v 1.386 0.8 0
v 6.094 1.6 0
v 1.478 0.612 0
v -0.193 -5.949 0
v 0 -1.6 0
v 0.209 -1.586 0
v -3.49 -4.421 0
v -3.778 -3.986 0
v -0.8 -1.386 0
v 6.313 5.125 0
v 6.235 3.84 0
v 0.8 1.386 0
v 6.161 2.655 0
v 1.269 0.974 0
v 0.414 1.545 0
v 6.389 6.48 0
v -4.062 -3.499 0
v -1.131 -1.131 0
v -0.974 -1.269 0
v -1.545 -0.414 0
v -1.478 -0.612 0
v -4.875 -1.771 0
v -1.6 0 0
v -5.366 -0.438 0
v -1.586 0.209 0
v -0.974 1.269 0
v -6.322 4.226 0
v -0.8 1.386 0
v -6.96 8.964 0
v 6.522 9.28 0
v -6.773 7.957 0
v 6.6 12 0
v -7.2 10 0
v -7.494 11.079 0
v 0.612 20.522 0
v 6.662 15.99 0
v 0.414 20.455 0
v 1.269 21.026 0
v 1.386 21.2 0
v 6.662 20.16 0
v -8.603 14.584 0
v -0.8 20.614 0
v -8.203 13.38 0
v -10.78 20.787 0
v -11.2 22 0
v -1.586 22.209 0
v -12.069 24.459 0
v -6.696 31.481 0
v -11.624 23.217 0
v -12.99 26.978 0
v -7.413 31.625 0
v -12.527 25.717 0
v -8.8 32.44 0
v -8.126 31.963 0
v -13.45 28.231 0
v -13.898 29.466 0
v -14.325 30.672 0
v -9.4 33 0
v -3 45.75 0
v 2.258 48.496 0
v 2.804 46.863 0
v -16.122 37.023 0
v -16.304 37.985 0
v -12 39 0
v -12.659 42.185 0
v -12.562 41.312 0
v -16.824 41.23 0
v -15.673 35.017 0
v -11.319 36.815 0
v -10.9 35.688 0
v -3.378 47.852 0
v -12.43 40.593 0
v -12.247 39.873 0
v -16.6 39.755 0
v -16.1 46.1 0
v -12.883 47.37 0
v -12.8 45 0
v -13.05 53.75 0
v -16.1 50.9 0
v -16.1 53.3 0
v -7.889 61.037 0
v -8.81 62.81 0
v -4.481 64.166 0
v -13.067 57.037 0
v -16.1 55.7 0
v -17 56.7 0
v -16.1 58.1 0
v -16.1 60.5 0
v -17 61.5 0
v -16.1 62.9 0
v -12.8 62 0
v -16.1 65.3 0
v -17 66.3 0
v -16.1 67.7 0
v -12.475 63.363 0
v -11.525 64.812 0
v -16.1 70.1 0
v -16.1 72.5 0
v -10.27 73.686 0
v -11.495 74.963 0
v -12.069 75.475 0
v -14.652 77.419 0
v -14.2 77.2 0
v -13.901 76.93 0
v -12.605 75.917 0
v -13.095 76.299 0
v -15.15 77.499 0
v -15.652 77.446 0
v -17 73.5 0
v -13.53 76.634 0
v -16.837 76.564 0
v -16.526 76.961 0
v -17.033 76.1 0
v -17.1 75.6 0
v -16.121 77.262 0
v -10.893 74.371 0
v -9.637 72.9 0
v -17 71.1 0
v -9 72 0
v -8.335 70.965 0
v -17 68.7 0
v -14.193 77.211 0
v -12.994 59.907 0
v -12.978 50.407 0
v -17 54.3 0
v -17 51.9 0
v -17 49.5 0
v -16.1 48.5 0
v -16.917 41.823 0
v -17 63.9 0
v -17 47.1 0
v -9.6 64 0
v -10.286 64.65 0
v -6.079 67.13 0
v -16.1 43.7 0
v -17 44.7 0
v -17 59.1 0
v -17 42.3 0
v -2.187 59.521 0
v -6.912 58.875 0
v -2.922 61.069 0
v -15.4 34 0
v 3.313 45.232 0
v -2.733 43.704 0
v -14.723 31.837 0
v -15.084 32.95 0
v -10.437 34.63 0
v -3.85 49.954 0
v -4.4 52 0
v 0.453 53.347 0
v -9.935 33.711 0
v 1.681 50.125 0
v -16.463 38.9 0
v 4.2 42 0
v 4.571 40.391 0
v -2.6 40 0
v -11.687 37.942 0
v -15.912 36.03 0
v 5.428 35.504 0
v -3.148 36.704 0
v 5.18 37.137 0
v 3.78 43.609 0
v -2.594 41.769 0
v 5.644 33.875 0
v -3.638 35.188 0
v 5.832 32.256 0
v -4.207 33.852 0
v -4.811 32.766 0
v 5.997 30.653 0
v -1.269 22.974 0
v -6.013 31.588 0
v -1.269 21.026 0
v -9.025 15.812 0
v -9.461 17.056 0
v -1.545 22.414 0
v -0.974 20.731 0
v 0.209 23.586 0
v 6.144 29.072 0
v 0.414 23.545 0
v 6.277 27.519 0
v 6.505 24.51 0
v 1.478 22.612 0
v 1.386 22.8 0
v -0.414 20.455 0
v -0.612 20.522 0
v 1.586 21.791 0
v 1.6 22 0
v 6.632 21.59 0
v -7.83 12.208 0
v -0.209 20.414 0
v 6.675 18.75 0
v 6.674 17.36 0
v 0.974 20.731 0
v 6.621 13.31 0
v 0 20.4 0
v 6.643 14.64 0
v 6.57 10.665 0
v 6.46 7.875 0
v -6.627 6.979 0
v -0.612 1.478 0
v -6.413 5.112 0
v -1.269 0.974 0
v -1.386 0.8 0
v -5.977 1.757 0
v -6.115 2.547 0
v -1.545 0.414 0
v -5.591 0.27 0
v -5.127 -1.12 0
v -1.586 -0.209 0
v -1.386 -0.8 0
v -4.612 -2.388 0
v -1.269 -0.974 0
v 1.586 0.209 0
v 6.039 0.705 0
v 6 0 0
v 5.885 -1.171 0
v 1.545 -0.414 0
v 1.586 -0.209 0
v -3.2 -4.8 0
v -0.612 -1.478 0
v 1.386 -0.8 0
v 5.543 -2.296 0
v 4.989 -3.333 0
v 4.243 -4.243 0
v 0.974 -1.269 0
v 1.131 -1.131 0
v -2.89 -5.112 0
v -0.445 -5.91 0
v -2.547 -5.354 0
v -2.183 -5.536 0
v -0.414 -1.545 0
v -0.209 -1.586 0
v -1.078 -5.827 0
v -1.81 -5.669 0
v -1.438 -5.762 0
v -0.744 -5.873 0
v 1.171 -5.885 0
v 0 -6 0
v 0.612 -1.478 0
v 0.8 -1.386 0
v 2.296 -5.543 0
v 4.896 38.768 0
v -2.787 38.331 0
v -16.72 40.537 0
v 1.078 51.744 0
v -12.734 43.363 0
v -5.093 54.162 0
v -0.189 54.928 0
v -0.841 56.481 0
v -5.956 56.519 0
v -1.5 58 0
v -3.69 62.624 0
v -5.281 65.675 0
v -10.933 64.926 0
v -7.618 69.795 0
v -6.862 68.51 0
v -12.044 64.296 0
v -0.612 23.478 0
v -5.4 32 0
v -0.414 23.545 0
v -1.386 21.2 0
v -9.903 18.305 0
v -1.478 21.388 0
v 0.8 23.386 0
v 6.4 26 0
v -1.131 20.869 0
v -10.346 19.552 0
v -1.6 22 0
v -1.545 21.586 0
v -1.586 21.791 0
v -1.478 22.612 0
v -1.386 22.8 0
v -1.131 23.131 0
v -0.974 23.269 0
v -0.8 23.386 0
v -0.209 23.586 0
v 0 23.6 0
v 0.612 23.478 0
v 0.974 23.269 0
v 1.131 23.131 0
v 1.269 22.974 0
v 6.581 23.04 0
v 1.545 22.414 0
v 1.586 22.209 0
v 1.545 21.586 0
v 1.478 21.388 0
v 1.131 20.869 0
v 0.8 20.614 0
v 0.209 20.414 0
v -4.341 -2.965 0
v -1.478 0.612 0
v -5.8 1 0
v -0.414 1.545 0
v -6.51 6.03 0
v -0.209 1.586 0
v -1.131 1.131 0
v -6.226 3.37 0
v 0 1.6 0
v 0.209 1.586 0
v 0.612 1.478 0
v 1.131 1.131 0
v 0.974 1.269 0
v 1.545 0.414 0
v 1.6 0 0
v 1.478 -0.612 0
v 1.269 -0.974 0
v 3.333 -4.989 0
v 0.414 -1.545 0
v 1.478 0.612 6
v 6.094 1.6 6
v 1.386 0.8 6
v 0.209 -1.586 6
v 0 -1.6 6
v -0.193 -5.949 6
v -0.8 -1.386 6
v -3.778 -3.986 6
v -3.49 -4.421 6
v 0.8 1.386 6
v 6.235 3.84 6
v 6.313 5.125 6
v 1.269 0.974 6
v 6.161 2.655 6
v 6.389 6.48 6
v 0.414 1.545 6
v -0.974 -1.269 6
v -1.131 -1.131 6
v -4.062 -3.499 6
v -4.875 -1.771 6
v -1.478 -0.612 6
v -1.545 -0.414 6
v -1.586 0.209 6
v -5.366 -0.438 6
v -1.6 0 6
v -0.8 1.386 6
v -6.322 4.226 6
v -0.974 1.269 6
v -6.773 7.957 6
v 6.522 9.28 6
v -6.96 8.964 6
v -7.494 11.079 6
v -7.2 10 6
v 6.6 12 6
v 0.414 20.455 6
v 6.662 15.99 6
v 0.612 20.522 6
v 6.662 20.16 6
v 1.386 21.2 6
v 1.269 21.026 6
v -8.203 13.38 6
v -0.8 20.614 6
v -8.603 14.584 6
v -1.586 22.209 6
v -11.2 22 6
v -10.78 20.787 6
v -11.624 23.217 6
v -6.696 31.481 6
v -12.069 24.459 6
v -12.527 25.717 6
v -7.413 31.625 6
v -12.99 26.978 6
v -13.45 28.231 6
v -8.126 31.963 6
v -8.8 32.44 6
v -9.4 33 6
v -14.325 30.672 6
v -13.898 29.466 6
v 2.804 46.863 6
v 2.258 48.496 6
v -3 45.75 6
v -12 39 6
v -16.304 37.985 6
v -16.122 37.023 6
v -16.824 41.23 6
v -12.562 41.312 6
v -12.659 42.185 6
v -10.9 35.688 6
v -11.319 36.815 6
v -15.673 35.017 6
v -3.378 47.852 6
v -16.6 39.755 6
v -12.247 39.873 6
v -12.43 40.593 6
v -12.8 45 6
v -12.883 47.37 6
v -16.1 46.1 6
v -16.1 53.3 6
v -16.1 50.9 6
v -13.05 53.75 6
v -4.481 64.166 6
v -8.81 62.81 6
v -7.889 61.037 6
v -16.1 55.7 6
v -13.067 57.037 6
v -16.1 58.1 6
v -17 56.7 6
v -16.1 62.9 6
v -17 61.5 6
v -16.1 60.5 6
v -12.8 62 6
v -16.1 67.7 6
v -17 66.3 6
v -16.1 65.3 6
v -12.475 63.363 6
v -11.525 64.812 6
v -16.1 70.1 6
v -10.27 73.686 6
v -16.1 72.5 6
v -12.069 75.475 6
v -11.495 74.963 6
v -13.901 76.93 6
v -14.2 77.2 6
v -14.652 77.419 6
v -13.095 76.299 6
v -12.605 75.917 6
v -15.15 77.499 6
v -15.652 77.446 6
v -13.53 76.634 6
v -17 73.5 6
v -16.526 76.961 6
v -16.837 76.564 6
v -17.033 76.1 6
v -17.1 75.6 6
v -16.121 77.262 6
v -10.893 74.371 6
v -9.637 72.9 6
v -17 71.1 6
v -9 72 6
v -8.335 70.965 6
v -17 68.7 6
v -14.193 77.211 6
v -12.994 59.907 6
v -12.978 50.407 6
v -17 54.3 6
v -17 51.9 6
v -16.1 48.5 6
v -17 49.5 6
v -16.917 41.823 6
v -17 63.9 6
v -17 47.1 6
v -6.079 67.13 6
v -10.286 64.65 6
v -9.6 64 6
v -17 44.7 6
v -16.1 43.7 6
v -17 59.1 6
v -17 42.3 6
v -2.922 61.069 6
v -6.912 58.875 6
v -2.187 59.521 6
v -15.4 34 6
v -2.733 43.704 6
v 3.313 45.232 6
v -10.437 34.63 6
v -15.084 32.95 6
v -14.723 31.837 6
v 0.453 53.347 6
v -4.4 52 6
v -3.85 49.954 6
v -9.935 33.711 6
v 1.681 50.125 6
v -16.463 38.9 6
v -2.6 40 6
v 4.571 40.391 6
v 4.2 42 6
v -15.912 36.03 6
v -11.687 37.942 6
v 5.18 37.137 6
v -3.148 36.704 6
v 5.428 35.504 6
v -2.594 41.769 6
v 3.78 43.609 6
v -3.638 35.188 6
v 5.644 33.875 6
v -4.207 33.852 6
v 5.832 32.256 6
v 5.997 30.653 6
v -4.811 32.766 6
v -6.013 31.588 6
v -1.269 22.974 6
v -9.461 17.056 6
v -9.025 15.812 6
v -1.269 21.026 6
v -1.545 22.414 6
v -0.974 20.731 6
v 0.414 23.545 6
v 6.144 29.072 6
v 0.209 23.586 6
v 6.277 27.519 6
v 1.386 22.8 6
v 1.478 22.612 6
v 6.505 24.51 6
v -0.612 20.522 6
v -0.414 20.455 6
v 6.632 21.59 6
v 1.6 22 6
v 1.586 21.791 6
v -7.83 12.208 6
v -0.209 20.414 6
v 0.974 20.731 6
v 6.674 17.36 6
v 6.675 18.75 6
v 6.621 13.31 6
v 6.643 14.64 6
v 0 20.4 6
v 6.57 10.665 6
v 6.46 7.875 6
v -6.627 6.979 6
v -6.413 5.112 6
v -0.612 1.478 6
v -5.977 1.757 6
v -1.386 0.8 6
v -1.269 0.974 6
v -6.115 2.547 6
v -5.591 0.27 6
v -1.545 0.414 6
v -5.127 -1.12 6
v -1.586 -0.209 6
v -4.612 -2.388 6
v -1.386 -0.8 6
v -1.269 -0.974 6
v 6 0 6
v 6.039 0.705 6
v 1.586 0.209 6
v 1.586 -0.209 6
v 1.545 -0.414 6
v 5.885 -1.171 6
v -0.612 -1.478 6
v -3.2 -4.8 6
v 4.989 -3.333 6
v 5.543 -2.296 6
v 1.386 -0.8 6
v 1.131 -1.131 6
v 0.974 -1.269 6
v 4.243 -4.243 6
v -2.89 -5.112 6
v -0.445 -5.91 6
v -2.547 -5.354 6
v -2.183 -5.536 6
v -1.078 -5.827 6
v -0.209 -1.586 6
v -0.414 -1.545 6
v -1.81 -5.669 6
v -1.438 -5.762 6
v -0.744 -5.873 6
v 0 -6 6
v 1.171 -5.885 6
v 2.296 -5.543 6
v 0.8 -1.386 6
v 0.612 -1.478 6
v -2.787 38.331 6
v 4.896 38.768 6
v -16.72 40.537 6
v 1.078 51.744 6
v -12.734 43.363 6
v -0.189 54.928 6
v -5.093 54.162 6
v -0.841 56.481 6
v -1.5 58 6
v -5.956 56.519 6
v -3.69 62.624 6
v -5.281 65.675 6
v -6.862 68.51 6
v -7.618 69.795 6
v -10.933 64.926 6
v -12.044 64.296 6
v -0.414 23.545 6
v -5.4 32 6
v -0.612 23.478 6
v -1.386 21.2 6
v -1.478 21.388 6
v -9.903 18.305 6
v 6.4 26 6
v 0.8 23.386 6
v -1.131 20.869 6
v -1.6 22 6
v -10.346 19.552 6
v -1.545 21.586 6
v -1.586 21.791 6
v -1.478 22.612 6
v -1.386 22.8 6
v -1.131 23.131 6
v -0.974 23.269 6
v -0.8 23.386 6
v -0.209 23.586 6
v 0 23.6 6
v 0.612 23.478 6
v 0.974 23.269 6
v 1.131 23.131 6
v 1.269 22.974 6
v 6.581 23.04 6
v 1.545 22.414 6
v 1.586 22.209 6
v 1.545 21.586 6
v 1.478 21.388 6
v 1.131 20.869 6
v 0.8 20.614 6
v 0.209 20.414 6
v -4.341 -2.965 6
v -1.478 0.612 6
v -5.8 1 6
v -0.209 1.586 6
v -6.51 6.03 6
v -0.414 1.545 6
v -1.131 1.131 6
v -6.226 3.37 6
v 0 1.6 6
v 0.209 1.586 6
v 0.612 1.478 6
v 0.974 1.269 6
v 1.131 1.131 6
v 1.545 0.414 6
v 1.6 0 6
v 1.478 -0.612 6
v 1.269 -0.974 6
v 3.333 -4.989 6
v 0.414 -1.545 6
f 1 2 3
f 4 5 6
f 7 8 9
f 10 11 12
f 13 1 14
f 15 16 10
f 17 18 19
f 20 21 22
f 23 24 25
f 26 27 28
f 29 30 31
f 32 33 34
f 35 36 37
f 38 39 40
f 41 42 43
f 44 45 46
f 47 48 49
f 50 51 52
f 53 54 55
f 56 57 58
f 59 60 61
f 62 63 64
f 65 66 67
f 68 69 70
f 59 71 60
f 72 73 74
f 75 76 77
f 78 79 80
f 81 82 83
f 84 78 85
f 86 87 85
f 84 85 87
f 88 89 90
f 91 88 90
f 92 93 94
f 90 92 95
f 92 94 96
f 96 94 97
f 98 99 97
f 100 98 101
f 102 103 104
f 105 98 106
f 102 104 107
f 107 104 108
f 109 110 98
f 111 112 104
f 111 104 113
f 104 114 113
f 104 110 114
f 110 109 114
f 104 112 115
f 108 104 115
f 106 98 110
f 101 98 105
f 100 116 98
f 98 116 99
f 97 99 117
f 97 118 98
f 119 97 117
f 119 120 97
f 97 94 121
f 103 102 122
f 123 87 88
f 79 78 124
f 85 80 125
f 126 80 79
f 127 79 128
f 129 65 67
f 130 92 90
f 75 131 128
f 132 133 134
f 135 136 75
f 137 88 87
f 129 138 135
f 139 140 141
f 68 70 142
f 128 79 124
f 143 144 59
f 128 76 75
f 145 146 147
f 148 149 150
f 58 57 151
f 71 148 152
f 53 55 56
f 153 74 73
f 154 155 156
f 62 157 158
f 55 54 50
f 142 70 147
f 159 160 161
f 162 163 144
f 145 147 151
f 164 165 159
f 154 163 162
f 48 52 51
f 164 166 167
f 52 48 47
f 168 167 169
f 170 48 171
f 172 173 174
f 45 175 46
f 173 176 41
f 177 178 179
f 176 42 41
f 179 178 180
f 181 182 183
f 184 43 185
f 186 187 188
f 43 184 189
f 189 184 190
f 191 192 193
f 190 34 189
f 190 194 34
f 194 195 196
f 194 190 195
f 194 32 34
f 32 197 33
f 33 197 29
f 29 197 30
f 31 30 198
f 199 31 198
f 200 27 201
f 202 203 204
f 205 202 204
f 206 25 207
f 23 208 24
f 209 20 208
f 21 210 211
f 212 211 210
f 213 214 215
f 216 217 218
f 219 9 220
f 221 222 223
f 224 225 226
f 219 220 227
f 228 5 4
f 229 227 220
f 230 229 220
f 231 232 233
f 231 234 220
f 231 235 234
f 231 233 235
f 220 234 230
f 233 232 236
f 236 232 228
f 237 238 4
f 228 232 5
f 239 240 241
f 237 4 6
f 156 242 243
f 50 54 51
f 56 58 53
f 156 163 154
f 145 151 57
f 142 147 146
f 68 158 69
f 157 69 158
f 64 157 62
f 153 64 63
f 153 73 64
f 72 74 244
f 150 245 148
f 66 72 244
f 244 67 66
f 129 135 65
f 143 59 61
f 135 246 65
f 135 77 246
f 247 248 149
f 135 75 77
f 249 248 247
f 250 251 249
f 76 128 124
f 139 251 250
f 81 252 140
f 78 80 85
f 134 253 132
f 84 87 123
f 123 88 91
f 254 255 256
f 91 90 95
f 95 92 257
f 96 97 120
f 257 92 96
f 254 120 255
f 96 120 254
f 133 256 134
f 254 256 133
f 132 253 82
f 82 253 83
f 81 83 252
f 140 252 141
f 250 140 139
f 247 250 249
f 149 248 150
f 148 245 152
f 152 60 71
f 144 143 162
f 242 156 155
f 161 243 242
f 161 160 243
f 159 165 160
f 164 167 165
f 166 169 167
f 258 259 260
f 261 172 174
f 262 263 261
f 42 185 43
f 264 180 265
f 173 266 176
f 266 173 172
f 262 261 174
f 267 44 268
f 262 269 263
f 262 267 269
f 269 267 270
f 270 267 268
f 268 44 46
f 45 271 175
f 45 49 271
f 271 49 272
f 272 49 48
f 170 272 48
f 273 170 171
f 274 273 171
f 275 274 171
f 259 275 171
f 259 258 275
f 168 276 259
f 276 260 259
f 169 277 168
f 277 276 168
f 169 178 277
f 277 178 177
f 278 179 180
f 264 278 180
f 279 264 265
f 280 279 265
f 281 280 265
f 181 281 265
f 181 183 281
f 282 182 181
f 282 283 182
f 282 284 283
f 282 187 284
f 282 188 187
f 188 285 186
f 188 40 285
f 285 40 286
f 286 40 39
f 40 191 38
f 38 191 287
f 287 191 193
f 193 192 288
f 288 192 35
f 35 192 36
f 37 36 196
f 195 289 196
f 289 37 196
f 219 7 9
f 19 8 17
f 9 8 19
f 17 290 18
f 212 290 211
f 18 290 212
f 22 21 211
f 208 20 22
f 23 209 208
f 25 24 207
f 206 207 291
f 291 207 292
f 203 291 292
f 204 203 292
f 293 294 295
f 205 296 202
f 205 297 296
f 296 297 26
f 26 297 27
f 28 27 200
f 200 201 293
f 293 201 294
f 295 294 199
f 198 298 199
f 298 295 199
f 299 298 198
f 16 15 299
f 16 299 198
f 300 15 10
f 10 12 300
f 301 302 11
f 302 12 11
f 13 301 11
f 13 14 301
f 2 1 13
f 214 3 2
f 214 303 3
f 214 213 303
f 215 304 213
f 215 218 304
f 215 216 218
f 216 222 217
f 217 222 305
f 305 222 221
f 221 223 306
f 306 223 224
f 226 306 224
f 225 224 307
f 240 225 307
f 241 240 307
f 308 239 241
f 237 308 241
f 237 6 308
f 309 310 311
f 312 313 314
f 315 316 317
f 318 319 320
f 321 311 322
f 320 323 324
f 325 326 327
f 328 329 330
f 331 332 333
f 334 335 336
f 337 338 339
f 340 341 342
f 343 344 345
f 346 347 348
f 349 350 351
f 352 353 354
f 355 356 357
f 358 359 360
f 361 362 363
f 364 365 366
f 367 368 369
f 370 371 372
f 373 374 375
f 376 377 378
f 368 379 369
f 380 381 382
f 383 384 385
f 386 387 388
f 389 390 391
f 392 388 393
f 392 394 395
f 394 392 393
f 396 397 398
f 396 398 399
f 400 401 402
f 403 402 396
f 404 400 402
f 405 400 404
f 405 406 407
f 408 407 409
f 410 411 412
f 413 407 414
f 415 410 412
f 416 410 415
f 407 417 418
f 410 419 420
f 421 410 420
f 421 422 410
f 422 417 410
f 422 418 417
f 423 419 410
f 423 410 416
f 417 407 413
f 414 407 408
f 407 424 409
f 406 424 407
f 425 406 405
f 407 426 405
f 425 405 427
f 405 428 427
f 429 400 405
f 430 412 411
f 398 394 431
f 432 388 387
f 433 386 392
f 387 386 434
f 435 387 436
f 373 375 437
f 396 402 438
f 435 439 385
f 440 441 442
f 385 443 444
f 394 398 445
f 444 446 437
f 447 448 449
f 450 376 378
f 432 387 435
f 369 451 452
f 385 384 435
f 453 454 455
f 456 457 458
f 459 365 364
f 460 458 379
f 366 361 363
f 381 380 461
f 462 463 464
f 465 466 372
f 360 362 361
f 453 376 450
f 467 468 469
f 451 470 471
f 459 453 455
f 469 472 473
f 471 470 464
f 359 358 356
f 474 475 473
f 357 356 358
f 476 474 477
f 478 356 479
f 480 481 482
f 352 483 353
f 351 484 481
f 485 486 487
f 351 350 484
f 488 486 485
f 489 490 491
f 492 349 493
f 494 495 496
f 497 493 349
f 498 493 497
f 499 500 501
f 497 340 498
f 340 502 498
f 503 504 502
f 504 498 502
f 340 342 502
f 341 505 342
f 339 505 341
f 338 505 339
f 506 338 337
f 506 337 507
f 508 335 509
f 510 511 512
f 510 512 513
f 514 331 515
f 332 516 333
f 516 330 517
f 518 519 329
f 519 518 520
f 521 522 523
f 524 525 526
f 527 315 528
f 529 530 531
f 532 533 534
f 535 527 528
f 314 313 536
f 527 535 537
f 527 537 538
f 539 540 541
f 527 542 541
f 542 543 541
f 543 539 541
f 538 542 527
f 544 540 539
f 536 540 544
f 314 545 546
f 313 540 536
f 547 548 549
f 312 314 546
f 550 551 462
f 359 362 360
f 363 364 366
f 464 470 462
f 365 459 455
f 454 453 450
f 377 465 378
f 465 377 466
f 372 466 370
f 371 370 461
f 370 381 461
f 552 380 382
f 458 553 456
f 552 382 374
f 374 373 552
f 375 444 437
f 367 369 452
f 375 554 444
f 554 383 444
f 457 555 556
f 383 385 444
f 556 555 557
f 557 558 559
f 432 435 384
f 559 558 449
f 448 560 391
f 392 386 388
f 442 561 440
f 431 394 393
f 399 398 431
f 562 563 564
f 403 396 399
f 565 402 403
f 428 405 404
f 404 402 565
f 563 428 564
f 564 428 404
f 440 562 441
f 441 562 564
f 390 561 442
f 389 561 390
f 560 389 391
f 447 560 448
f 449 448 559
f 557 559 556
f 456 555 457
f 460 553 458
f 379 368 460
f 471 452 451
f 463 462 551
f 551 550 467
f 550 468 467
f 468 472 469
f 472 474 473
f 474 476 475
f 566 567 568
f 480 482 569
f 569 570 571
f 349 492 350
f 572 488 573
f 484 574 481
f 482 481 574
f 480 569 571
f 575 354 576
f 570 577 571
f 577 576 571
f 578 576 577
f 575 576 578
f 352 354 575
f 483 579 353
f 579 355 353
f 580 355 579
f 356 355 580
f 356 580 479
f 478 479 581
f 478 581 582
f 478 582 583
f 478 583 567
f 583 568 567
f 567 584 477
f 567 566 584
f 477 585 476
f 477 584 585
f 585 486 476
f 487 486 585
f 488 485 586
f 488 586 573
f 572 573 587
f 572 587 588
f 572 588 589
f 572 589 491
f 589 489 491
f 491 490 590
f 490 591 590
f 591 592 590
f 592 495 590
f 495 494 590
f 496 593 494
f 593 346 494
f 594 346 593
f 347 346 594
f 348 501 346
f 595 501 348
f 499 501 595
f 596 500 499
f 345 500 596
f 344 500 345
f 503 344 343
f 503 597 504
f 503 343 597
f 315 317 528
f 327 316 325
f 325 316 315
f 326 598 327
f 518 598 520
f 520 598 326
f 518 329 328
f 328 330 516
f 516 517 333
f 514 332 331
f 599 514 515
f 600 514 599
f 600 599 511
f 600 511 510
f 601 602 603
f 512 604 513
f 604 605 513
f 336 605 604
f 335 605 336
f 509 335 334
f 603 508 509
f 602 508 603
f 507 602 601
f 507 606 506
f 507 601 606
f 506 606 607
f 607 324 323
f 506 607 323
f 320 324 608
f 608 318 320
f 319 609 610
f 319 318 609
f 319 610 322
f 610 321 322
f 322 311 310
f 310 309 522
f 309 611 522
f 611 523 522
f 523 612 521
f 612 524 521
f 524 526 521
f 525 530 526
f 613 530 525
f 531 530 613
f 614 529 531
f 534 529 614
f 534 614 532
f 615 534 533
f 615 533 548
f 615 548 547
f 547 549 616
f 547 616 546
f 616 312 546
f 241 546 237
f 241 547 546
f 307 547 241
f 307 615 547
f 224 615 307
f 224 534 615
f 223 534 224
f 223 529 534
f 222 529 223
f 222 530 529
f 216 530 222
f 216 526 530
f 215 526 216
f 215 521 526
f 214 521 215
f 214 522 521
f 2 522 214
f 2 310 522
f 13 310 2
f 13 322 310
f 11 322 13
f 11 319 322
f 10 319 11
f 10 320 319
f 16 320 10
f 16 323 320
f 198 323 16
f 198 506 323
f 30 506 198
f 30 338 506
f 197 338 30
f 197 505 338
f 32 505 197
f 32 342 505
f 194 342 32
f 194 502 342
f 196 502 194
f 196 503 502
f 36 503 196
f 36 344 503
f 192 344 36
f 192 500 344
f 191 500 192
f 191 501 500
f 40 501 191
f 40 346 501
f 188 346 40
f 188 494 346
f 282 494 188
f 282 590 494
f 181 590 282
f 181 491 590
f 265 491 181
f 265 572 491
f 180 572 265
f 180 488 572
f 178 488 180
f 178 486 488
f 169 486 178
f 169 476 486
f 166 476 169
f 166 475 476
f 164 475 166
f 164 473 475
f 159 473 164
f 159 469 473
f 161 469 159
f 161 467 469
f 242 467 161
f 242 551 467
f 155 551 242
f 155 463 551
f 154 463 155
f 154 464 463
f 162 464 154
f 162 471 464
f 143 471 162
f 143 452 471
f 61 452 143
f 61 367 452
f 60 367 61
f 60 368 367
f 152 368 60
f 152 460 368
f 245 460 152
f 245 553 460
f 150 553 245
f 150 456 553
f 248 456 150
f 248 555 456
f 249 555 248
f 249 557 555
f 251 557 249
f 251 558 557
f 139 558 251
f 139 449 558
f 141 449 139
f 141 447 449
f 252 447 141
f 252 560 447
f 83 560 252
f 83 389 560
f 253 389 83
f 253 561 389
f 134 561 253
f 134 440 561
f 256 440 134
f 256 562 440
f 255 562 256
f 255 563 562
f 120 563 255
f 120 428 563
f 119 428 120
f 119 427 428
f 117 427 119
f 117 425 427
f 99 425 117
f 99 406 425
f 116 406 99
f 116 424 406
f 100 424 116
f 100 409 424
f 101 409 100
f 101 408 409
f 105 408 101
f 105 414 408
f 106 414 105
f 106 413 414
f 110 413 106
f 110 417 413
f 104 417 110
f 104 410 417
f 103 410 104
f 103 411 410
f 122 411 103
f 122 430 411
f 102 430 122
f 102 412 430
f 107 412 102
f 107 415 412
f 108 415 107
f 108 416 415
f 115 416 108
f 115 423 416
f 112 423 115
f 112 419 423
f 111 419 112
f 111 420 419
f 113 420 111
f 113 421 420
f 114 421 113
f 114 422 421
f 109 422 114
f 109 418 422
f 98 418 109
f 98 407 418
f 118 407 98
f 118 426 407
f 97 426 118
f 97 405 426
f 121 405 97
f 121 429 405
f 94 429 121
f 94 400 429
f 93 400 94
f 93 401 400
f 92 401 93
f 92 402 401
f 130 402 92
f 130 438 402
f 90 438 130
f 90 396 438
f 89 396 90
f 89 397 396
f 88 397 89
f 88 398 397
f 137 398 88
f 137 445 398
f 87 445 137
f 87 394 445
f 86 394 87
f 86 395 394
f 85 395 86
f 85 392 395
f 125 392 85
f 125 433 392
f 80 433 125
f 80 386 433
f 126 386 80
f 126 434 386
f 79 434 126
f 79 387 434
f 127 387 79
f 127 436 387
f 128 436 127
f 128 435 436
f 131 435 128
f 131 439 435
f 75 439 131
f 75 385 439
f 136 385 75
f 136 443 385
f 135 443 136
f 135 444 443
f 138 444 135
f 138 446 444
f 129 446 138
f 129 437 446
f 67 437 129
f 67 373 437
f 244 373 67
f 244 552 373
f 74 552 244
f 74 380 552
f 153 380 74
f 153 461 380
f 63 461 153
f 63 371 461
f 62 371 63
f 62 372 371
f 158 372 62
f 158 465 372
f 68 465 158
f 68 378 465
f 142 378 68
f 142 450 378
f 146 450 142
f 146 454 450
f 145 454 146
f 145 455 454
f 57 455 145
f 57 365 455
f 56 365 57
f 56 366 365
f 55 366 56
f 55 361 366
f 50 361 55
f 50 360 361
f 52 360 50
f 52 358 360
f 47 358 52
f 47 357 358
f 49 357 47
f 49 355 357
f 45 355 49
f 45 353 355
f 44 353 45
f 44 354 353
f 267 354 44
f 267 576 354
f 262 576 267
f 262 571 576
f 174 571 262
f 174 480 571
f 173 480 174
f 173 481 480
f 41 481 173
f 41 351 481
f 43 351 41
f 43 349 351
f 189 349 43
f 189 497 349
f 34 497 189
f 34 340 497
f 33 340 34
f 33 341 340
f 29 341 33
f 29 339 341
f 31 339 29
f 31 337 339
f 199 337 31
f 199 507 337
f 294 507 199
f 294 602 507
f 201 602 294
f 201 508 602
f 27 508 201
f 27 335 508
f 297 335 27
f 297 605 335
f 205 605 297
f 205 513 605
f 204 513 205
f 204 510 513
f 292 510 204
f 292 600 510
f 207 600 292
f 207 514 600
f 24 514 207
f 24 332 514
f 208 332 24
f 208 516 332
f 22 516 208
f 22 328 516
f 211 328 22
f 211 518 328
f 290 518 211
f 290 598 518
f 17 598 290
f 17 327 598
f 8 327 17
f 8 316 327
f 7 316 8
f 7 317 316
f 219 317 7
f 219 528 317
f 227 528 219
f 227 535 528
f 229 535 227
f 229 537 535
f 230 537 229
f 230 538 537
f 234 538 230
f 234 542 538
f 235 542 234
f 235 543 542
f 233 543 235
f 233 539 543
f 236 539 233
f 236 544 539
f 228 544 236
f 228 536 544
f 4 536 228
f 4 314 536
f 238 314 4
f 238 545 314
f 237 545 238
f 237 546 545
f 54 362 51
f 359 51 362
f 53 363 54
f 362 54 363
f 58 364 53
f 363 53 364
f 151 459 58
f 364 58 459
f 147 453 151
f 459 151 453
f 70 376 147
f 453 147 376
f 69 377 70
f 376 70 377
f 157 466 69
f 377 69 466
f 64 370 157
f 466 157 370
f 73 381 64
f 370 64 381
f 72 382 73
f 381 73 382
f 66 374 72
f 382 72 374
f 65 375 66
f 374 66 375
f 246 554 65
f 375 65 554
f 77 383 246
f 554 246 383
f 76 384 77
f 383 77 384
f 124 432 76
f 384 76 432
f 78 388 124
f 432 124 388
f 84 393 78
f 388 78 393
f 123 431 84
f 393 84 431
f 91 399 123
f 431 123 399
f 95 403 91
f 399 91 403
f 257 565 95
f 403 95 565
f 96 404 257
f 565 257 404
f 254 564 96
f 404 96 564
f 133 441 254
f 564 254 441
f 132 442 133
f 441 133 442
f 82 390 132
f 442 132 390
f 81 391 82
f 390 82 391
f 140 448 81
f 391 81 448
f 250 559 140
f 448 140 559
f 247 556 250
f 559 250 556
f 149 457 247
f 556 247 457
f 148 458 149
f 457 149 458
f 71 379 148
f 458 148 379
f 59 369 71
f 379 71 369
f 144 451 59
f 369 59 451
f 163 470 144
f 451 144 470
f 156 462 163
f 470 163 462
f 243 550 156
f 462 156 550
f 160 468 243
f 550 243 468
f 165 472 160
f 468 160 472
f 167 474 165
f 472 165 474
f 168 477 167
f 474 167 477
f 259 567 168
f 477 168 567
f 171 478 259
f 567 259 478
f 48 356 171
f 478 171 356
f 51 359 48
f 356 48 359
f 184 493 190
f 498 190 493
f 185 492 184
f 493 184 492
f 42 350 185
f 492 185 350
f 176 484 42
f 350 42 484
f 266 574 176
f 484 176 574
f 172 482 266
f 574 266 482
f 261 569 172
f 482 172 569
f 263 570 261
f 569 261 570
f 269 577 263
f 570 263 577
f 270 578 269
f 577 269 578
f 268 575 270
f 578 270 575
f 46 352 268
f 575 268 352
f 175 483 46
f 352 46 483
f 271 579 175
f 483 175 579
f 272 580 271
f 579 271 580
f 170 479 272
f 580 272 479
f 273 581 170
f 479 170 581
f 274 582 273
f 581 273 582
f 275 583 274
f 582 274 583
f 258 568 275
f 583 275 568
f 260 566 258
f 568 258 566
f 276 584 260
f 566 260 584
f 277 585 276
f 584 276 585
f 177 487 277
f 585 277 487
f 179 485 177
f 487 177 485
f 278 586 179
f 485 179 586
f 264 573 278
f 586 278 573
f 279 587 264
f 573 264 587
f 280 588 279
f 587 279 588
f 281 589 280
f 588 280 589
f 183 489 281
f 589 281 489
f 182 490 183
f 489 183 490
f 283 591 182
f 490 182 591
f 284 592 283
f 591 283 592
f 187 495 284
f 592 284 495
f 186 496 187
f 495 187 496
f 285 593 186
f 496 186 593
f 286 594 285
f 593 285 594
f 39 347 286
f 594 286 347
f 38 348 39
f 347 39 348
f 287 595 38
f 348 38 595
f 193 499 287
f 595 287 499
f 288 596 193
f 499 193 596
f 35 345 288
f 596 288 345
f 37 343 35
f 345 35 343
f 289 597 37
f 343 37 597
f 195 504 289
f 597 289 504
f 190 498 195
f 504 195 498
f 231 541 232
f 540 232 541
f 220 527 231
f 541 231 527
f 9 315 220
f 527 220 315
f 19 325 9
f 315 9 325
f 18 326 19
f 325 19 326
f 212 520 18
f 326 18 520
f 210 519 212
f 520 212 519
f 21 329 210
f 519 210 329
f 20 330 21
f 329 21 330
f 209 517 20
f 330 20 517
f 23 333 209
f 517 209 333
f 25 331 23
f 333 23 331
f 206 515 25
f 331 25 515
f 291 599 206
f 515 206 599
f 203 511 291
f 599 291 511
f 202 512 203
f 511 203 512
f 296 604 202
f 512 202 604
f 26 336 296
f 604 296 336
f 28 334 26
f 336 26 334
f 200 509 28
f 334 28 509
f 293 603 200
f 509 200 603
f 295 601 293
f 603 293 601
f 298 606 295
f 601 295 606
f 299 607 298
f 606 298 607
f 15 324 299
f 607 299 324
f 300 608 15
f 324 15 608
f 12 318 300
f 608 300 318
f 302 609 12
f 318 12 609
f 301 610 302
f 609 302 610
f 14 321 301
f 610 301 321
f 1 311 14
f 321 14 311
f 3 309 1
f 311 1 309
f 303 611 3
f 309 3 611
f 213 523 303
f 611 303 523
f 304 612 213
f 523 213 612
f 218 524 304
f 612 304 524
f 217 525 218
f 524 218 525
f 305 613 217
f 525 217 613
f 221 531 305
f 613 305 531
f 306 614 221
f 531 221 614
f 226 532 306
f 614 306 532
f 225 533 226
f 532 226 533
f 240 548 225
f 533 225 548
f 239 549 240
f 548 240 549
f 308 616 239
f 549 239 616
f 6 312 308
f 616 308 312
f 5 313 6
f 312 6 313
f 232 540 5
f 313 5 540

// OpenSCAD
// Pinza a ingranaggi e parallelogramma. Generato da genera_pinza.py: modifica li' le misure.
$fn=48;
parte = "dito"; // dito, biella_motore, biella_folle, leva, piastra_bassa, piastra_alta, colonnina

module dito() linear_extrude(6.0)
difference() { polygon([[6.000,0.000],[6.039,0.705],[6.094,1.600],[6.161,2.655],[6.235,3.840],[6.313,5.125],[6.389,6.480],[6.460,7.875],[6.522,9.280],[6.570,10.665],[6.600,12.000],[6.621,13.310],[6.643,14.640],[6.662,15.990],[6.674,17.360],[6.675,18.750],[6.662,20.160],[6.632,21.590],[6.581,23.040],[6.505,24.510],[6.400,26.000],[6.277,27.519],[6.144,29.072],[5.997,30.653],[5.832,32.256],[5.644,33.875],[5.428,35.504],[5.180,37.137],[4.896,38.768],[4.571,40.391],[4.200,42.000],[3.780,43.609],[3.313,45.232],[2.804,46.863],[2.258,48.496],[1.681,50.125],[1.078,51.744],[0.453,53.347],[-0.189,54.928],[-0.841,56.481],[-1.500,58.000],[-2.187,59.521],[-2.922,61.069],[-3.690,62.624],[-4.481,64.166],[-5.281,65.675],[-6.079,67.130],[-6.862,68.510],[-7.618,69.795],[-8.335,70.965],[-9.000,72.000],[-9.637,72.900],[-10.270,73.686],[-10.893,74.371],[-11.495,74.963],[-12.069,75.475],[-12.605,75.917],[-13.095,76.299],[-13.530,76.634],[-13.901,76.930],[-14.200,77.200],[-14.193,77.211],[-14.652,77.419],[-15.150,77.499],[-15.652,77.446],[-16.121,77.262],[-16.526,76.961],[-16.837,76.564],[-17.033,76.100],[-17.100,75.600],[-17.000,73.500],[-16.100,72.500],[-17.000,71.100],[-17.000,71.100],[-16.100,70.100],[-17.000,68.700],[-17.000,68.700],[-16.100,67.700],[-17.000,66.300],[-17.000,66.300],[-16.100,65.300],[-17.000,63.900],[-17.000,63.900],[-16.100,62.900],[-17.000,61.500],[-17.000,61.500],[-16.100,60.500],[-17.000,59.100],[-17.000,59.100],[-16.100,58.100],[-17.000,56.700],[-17.000,56.700],[-16.100,55.700],[-17.000,54.300],[-17.000,54.300],[-16.100,53.300],[-17.000,51.900],[-17.000,51.900],[-16.100,50.900],[-17.000,49.500],[-17.000,49.500],[-16.100,48.500],[-17.000,47.100],[-17.000,47.100],[-16.100,46.100],[-17.000,44.700],[-17.000,44.700],[-16.100,43.700],[-17.000,42.300],[-17.000,42.300],[-16.917,41.823],[-16.824,41.230],[-16.720,40.537],[-16.600,39.755],[-16.463,38.900],[-16.304,37.985],[-16.122,37.023],[-15.912,36.030],[-15.673,35.017],[-15.400,34.000],[-15.084,32.950],[-14.723,31.837],[-14.325,30.672],[-13.898,29.466],[-13.450,28.231],[-12.990,26.978],[-12.527,25.717],[-12.069,24.459],[-11.624,23.217],[-11.200,22.000],[-10.780,20.787],[-10.346,19.552],[-9.903,18.305],[-9.461,17.056],[-9.025,15.812],[-8.603,14.584],[-8.203,13.380],[-7.830,12.208],[-7.494,11.079],[-7.200,10.000],[-6.960,8.964],[-6.773,7.957],[-6.627,6.979],[-6.510,6.030],[-6.413,5.112],[-6.322,4.226],[-6.226,3.370],[-6.115,2.547],[-5.977,1.757],[-5.800,1.000],[-5.591,0.270],[-5.366,-0.438],[-5.127,-1.120],[-4.875,-1.771],[-4.612,-2.388],[-4.341,-2.965],[-4.062,-3.499],[-3.778,-3.986],[-3.490,-4.421],[-3.200,-4.800],[-2.890,-5.112],[-2.547,-5.354],[-2.183,-5.536],[-1.810,-5.669],[-1.438,-5.762],[-1.078,-5.827],[-0.744,-5.873],[-0.445,-5.910],[-0.193,-5.949],[0.000,-6.000],[1.171,-5.885],[2.296,-5.543],[3.333,-4.989],[4.243,-4.243],[4.989,-3.333],[5.543,-2.296],[5.885,-1.171],[6.000,0.000]]);
translate([0,0]) circle(d=3.2);
translate([0,22.0]) circle(d=3.2);
polygon([[-12.800,45.000],[-12.883,47.370],[-12.978,50.407],[-13.050,53.750],[-13.067,57.037],[-12.994,59.907],[-12.800,62.000],[-12.475,63.363],[-12.044,64.296],[-11.525,64.812],[-10.933,64.926],[-10.286,64.650],[-9.600,64.000],[-8.810,62.810],[-7.889,61.037],[-6.912,58.875],[-5.956,56.519],[-5.093,54.162],[-4.400,52.000],[-3.850,49.954],[-3.378,47.852],[-3.000,45.750],[-2.733,43.704],[-2.594,41.769],[-2.600,40.000],[-2.787,38.331],[-3.148,36.704],[-3.638,35.188],[-4.207,33.852],[-4.811,32.766],[-5.400,32.000],[-6.013,31.588],[-6.696,31.481],[-7.413,31.625],[-8.126,31.963],[-8.800,32.440],[-9.400,33.000],[-9.935,33.711],[-10.437,34.630],[-10.900,35.688],[-11.319,36.815],[-11.687,37.942],[-12.000,39.000],[-12.247,39.873],[-12.430,40.593],[-12.562,41.312],[-12.659,42.185],[-12.734,43.363]]);
}

module biella_motore() linear_extrude(5)
difference() { polygon([[8.200,-5.200],[40.000,-6.000],[41.171,-5.885],[42.296,-5.543],[43.333,-4.989],[44.243,-4.243],[44.989,-3.333],[45.543,-2.296],[45.885,-1.171],[46.000,0.000],[45.885,1.171],[45.543,2.296],[44.989,3.333],[44.243,4.243],[43.333,4.989],[42.296,5.543],[41.171,5.885],[40.000,6.000],[8.200,5.200],[6.233,6.141],[6.519,6.768],[6.673,6.990],[6.800,7.238],[6.907,7.504],[6.996,7.783],[7.069,8.076],[7.126,8.379],[6.715,8.713],[6.430,8.594],[6.159,8.462],[5.904,8.316],[5.667,8.156],[5.450,7.981],[5.265,7.783],[4.711,7.373],[4.030,7.767],[4.108,8.451],[4.186,8.710],[4.230,8.985],[4.250,9.271],[4.249,9.564],[4.228,9.865],[4.188,10.171],[3.694,10.361],[3.459,10.160],[3.243,9.951],[3.045,9.733],[2.869,9.508],[2.717,9.274],[2.602,9.029],[2.202,8.468],[1.433,8.632],[1.295,9.307],[1.290,9.578],[1.246,9.853],[1.177,10.130],[1.085,10.409],[0.972,10.689],[0.840,10.968],[0.311,10.996],[0.150,10.732],[0.009,10.466],[-0.112,10.198],[-0.210,9.929],[-0.281,9.660],[-0.316,9.392],[-0.523,8.734],[-1.305,8.652],[-1.644,9.252],[-1.733,9.507],[-1.859,9.756],[-2.011,9.998],[-2.185,10.235],[-2.378,10.466],[-2.590,10.691],[-3.102,10.554],[-3.173,10.253],[-3.226,9.956],[-3.258,9.664],[-3.268,9.378],[-3.253,9.100],[-3.202,8.834],[-3.196,8.145],[-3.915,7.826],[-4.423,8.291],[-4.586,8.507],[-4.783,8.704],[-5.002,8.887],[-5.241,9.059],[-5.496,9.219],[-5.767,9.367],[-6.211,9.078],[-6.186,8.771],[-6.144,8.472],[-6.084,8.185],[-6.006,7.910],[-5.906,7.650],[-5.776,7.413],[-5.557,6.759],[-6.141,6.233],[-6.768,6.519],[-6.990,6.673],[-7.238,6.800],[-7.504,6.907],[-7.783,6.996],[-8.076,7.069],[-8.379,7.126],[-8.713,6.715],[-8.594,6.430],[-8.462,6.159],[-8.316,5.904],[-8.156,5.667],[-7.981,5.450],[-7.783,5.265],[-7.373,4.711],[-7.767,4.030],[-8.451,4.108],[-8.710,4.186],[-8.985,4.230],[-9.271,4.250],[-9.564,4.249],[-9.865,4.228],[-10.171,4.188],[-10.361,3.694],[-10.160,3.459],[-9.951,3.243],[-9.733,3.045],[-9.508,2.869],[-9.274,2.717],[-9.029,2.602],[-8.468,2.202],[-8.632,1.433],[-9.307,1.295],[-9.578,1.290],[-9.853,1.246],[-10.130,1.177],[-10.409,1.085],[-10.689,0.972],[-10.968,0.840],[-10.996,0.311],[-10.732,0.150],[-10.466,0.009],[-10.198,-0.112],[-9.929,-0.210],[-9.660,-0.281],[-9.392,-0.316],[-8.734,-0.523],[-8.652,-1.305],[-9.252,-1.644],[-9.507,-1.733],[-9.756,-1.859],[-9.998,-2.011],[-10.235,-2.185],[-10.466,-2.378],[-10.691,-2.590],[-10.554,-3.102],[-10.253,-3.173],[-9.956,-3.226],[-9.664,-3.258],[-9.378,-3.268],[-9.100,-3.253],[-8.834,-3.202],[-8.145,-3.196],[-7.826,-3.915],[-8.291,-4.423],[-8.507,-4.586],[-8.704,-4.783],[-8.887,-5.002],[-9.059,-5.241],[-9.219,-5.496],[-9.367,-5.767],[-9.078,-6.211],[-8.771,-6.186],[-8.472,-6.144],[-8.185,-6.084],[-7.910,-6.006],[-7.650,-5.906],[-7.413,-5.776],[-6.759,-5.557],[-6.233,-6.141],[-6.519,-6.768],[-6.673,-6.990],[-6.800,-7.238],[-6.907,-7.504],[-6.996,-7.783],[-7.069,-8.076],[-7.126,-8.379],[-6.715,-8.713],[-6.430,-8.594],[-6.159,-8.462],[-5.904,-8.316],[-5.667,-8.156],[-5.450,-7.981],[-5.265,-7.783],[-4.711,-7.373],[-4.030,-7.767],[-4.108,-8.451],[-4.186,-8.710],[-4.230,-8.985],[-4.250,-9.271],[-4.249,-9.564],[-4.228,-9.865],[-4.188,-10.171],[-3.694,-10.361],[-3.459,-10.160],[-3.243,-9.951],[-3.045,-9.733],[-2.869,-9.508],[-2.717,-9.274],[-2.602,-9.029],[-2.202,-8.468],[-1.433,-8.632],[-1.295,-9.307],[-1.290,-9.578],[-1.246,-9.853],[-1.177,-10.130],[-1.085,-10.409],[-0.972,-10.689],[-0.840,-10.968],[-0.311,-10.996],[-0.150,-10.732],[-0.009,-10.466],[0.112,-10.198],[0.210,-9.929],[0.281,-9.660],[0.316,-9.392],[0.523,-8.734],[1.305,-8.652],[1.644,-9.252],[1.733,-9.507],[1.859,-9.756],[2.011,-9.998],[2.185,-10.235],[2.378,-10.466],[2.590,-10.691],[3.102,-10.554],[3.173,-10.253],[3.226,-9.956],[3.258,-9.664],[3.268,-9.378],[3.253,-9.100],[3.202,-8.834],[3.196,-8.145],[3.915,-7.826],[4.423,-8.291],[4.586,-8.507],[4.783,-8.704],[5.002,-8.887],[5.241,-9.059],[5.496,-9.219],[5.767,-9.367],[6.211,-9.078],[6.186,-8.771],[6.144,-8.472],[6.084,-8.185],[6.006,-7.910],[5.906,-7.650],[5.776,-7.413],[5.557,-6.759],[6.141,-6.233],[6.768,-6.519],[6.990,-6.673],[7.238,-6.800],[7.504,-6.907],[7.783,-6.996],[8.076,-7.069]]);
translate([0,0]) circle(d=3.2);
translate([40.0,0]) circle(d=3.2);
polygon([[29.000,-2.300],[29.449,-2.256],[29.880,-2.125],[30.278,-1.912],[30.626,-1.626],[30.912,-1.278],[31.125,-0.880],[31.256,-0.449],[31.300,0.000],[31.256,0.449],[31.125,0.880],[30.912,1.278],[30.626,1.626],[30.278,1.912],[29.880,2.125],[29.449,2.256],[29.000,2.300],[16.000,2.300],[15.551,2.256],[15.120,2.125],[14.722,1.912],[14.374,1.626],[14.088,1.278],[13.875,0.880],[13.744,0.449],[13.700,0.000],[13.744,-0.449],[13.875,-0.880],[14.088,-1.278],[14.374,-1.626],[14.722,-1.912],[15.120,-2.125],[15.551,-2.256],[16.000,-2.300]]);
}

module biella_folle() linear_extrude(5)
difference() { polygon([[8.200,-5.200],[40.000,-6.000],[41.171,-5.885],[42.296,-5.543],[43.333,-4.989],[44.243,-4.243],[44.989,-3.333],[45.543,-2.296],[45.885,-1.171],[46.000,0.000],[45.885,1.171],[45.543,2.296],[44.989,3.333],[44.243,4.243],[43.333,4.989],[42.296,5.543],[41.171,5.885],[40.000,6.000],[8.200,5.200],[7.995,7.555],[7.695,7.482],[7.407,7.394],[7.132,7.290],[6.873,7.169],[6.632,7.030],[6.418,6.864],[5.807,6.546],[5.195,7.041],[5.380,7.705],[5.497,7.948],[5.584,8.213],[5.648,8.492],[5.692,8.782],[5.719,9.082],[5.728,9.391],[5.269,9.656],[5.006,9.494],[4.759,9.321],[4.530,9.137],[4.321,8.942],[4.135,8.735],[3.983,8.511],[3.500,8.020],[2.765,8.301],[2.736,8.990],[2.772,9.258],[2.772,9.536],[2.747,9.821],[2.700,10.111],[2.632,10.405],[2.545,10.701],[2.027,10.812],[1.827,10.576],[1.646,10.335],[1.485,10.090],[1.346,9.840],[1.233,9.585],[1.158,9.325],[0.850,8.709],[0.065,8.750],[-0.176,9.395],[-0.225,9.661],[-0.310,9.926],[-0.422,10.190],[-0.557,10.451],[-0.712,10.709],[-0.886,10.964],[-1.413,10.909],[-1.530,10.623],[-1.628,10.338],[-1.706,10.055],[-1.760,9.774],[-1.789,9.497],[-1.781,9.227],[-1.883,8.545],[-2.642,8.342],[-3.071,8.881],[-3.199,9.119],[-3.363,9.345],[-3.550,9.561],[-3.759,9.767],[-3.986,9.965],[-4.231,10.154],[-4.715,9.938],[-4.738,9.630],[-4.743,9.329],[-4.729,9.036],[-4.695,8.752],[-4.636,8.479],[-4.545,8.225],[-4.431,7.545],[-5.091,7.117],[-5.665,7.497],[-5.861,7.684],[-6.086,7.848],[-6.331,7.995],[-6.593,8.128],[-6.871,8.246],[-7.161,8.349],[-7.555,7.995],[-7.482,7.695],[-7.394,7.407],[-7.290,7.132],[-7.169,6.873],[-7.030,6.632],[-6.864,6.418],[-6.546,5.807],[-7.041,5.195],[-7.705,5.380],[-7.948,5.497],[-8.213,5.584],[-8.492,5.648],[-8.782,5.692],[-9.082,5.719],[-9.391,5.728],[-9.656,5.269],[-9.494,5.006],[-9.321,4.759],[-9.137,4.530],[-8.942,4.321],[-8.735,4.135],[-8.511,3.983],[-8.020,3.500],[-8.301,2.765],[-8.990,2.736],[-9.258,2.772],[-9.536,2.772],[-9.821,2.747],[-10.111,2.700],[-10.405,2.632],[-10.701,2.545],[-10.812,2.027],[-10.576,1.827],[-10.335,1.646],[-10.090,1.485],[-9.840,1.346],[-9.585,1.233],[-9.325,1.158],[-8.709,0.850],[-8.750,0.065],[-9.395,-0.176],[-9.661,-0.225],[-9.926,-0.310],[-10.190,-0.422],[-10.451,-0.557],[-10.709,-0.712],[-10.964,-0.886],[-10.909,-1.413],[-10.623,-1.530],[-10.338,-1.628],[-10.055,-1.706],[-9.774,-1.760],[-9.497,-1.789],[-9.227,-1.781],[-8.545,-1.883],[-8.342,-2.642],[-8.881,-3.071],[-9.119,-3.199],[-9.345,-3.363],[-9.561,-3.550],[-9.767,-3.759],[-9.965,-3.986],[-10.154,-4.231],[-9.938,-4.715],[-9.630,-4.738],[-9.329,-4.743],[-9.036,-4.729],[-8.752,-4.695],[-8.479,-4.636],[-8.225,-4.545],[-7.545,-4.431],[-7.117,-5.091],[-7.497,-5.665],[-7.684,-5.861],[-7.848,-6.086],[-7.995,-6.331],[-8.128,-6.593],[-8.246,-6.871],[-8.349,-7.161],[-7.995,-7.555],[-7.695,-7.482],[-7.407,-7.394],[-7.132,-7.290],[-6.873,-7.169],[-6.632,-7.030],[-6.418,-6.864],[-5.807,-6.546],[-5.195,-7.041],[-5.380,-7.705],[-5.497,-7.948],[-5.584,-8.213],[-5.648,-8.492],[-5.692,-8.782],[-5.719,-9.082],[-5.728,-9.391],[-5.269,-9.656],[-5.006,-9.494],[-4.759,-9.321],[-4.530,-9.137],[-4.321,-8.942],[-4.135,-8.735],[-3.983,-8.511],[-3.500,-8.020],[-2.765,-8.301],[-2.736,-8.990],[-2.772,-9.258],[-2.772,-9.536],[-2.747,-9.821],[-2.700,-10.111],[-2.632,-10.405],[-2.545,-10.701],[-2.027,-10.812],[-1.827,-10.576],[-1.646,-10.335],[-1.485,-10.090],[-1.346,-9.840],[-1.233,-9.585],[-1.158,-9.325],[-0.850,-8.709],[-0.065,-8.750],[0.176,-9.395],[0.225,-9.661],[0.310,-9.926],[0.422,-10.190],[0.557,-10.451],[0.712,-10.709],[0.886,-10.964],[1.413,-10.909],[1.530,-10.623],[1.628,-10.338],[1.706,-10.055],[1.760,-9.774],[1.789,-9.497],[1.781,-9.227],[1.883,-8.545],[2.642,-8.342],[3.071,-8.881],[3.199,-9.119],[3.363,-9.345],[3.550,-9.561],[3.759,-9.767],[3.986,-9.965],[4.231,-10.154],[4.715,-9.938],[4.738,-9.630],[4.743,-9.329],[4.729,-9.036],[4.695,-8.752],[4.636,-8.479],[4.545,-8.225],[4.431,-7.545],[5.091,-7.117],[5.665,-7.497],[5.861,-7.684],[6.086,-7.848],[6.331,-7.995],[6.593,-8.128],[6.871,-8.246],[7.161,-8.349],[7.555,-7.995],[7.482,-7.695],[7.394,-7.407],[7.290,-7.132],[7.169,-6.873],[7.030,-6.632],[6.864,-6.418],[6.546,-5.807]]);
translate([0,0]) circle(d=3.2);
translate([40.0,0]) circle(d=3.2);
polygon([[29.000,-2.300],[29.449,-2.256],[29.880,-2.125],[30.278,-1.912],[30.626,-1.626],[30.912,-1.278],[31.125,-0.880],[31.256,-0.449],[31.300,0.000],[31.256,0.449],[31.125,0.880],[30.912,1.278],[30.626,1.626],[30.278,1.912],[29.880,2.125],[29.449,2.256],[29.000,2.300],[16.000,2.300],[15.551,2.256],[15.120,2.125],[14.722,1.912],[14.374,1.626],[14.088,1.278],[13.875,0.880],[13.744,0.449],[13.700,0.000],[13.744,-0.449],[13.875,-0.880],[14.088,-1.278],[14.374,-1.626],[14.722,-1.912],[15.120,-2.125],[15.551,-2.256],[16.000,-2.300]]);
}

module leva() linear_extrude(5)
difference() { polygon([[40.000,-5.500],[41.073,-5.394],[42.105,-5.081],[43.056,-4.573],[43.889,-3.889],[44.573,-3.056],[45.081,-2.105],[45.394,-1.073],[45.500,0.000],[45.394,1.073],[45.081,2.105],[44.573,3.056],[43.889,3.889],[43.056,4.573],[42.105,5.081],[41.073,5.394],[40.000,5.500],[0.000,5.500],[-1.073,5.394],[-2.105,5.081],[-3.056,4.573],[-3.889,3.889],[-4.573,3.056],[-5.081,2.105],[-5.394,1.073],[-5.500,0.000],[-5.394,-1.073],[-5.081,-2.105],[-4.573,-3.056],[-3.889,-3.889],[-3.056,-4.573],[-2.105,-5.081],[-1.073,-5.394],[-0.000,-5.500]]);
translate([0,0]) circle(d=3.2);
translate([40.0,0]) circle(d=3.2);
polygon([[30.000,-2.200],[30.429,-2.158],[30.842,-2.033],[31.222,-1.829],[31.556,-1.556],[31.829,-1.222],[32.033,-0.842],[32.158,-0.429],[32.200,0.000],[32.158,0.429],[32.033,0.842],[31.829,1.222],[31.556,1.556],[31.222,1.829],[30.842,2.033],[30.429,2.158],[30.000,2.200],[10.000,2.200],[9.571,2.158],[9.158,2.033],[8.778,1.829],[8.444,1.556],[8.171,1.222],[7.967,0.842],[7.842,0.429],[7.800,0.000],[7.842,-0.429],[7.967,-0.842],[8.171,-1.222],[8.444,-1.556],[8.778,-1.829],[9.158,-2.033],[9.571,-2.158],[10.000,-2.200]]);
}

module piastra_bassa() linear_extrude(4.0)
difference() { polygon([[19.000,-38.000],[20.366,-37.865],[21.679,-37.467],[22.889,-36.820],[23.950,-35.950],[24.820,-34.889],[25.467,-33.679],[25.865,-32.366],[26.000,-31.000],[26.000,26.000],[25.865,27.366],[25.467,28.679],[24.820,29.889],[23.950,30.950],[22.889,31.820],[21.679,32.467],[20.366,32.865],[19.000,33.000],[-19.000,33.000],[-20.366,32.865],[-21.679,32.467],[-22.889,31.820],[-23.950,30.950],[-24.820,29.889],[-25.467,28.679],[-25.865,27.366],[-26.000,26.000],[-26.000,-31.000],[-25.865,-32.366],[-25.467,-33.679],[-24.820,-34.889],[-23.950,-35.950],[-22.889,-36.820],[-21.679,-37.467],[-20.366,-37.865],[-19.000,-38.000]]);
translate([-10,0]) circle(d=3.2);
translate([10,0]) circle(d=12.0);
translate([10,7.949999999999999]) circle(d=1.8);
translate([10,-19.75]) circle(d=1.8);
translate([-18,-20]) circle(d=3.2);
translate([18,-20]) circle(d=3.2);
translate([0,27]) circle(d=3.2);
translate([-16,-33]) circle(d=3.2);
translate([16,-33]) circle(d=3.2);
polygon([[2.000,11.000],[2.585,11.058],[3.148,11.228],[3.667,11.506],[4.121,11.879],[4.494,12.333],[4.772,12.852],[4.942,13.415],[5.000,14.000],[5.000,16.000],[4.942,16.585],[4.772,17.148],[4.494,17.667],[4.121,18.121],[3.667,18.494],[3.148,18.772],[2.585,18.942],[2.000,19.000],[-12.000,19.000],[-12.585,18.942],[-13.148,18.772],[-13.667,18.494],[-14.121,18.121],[-14.494,17.667],[-14.772,17.148],[-14.942,16.585],[-15.000,16.000],[-15.000,14.000],[-14.942,13.415],[-14.772,12.852],[-14.494,12.333],[-14.121,11.879],[-13.667,11.506],[-13.148,11.228],[-12.585,11.058],[-12.000,11.000]]);
}

module piastra_alta() linear_extrude(4.0)
difference() { polygon([[19.000,-28.000],[20.366,-27.865],[21.679,-27.467],[22.889,-26.820],[23.950,-25.950],[24.820,-24.889],[25.467,-23.679],[25.865,-22.366],[26.000,-21.000],[26.000,26.000],[25.865,27.366],[25.467,28.679],[24.820,29.889],[23.950,30.950],[22.889,31.820],[21.679,32.467],[20.366,32.865],[19.000,33.000],[-19.000,33.000],[-20.366,32.865],[-21.679,32.467],[-22.889,31.820],[-23.950,30.950],[-24.820,29.889],[-25.467,28.679],[-25.865,27.366],[-26.000,26.000],[-26.000,-21.000],[-25.865,-22.366],[-25.467,-23.679],[-24.820,-24.889],[-23.950,-25.950],[-22.889,-26.820],[-21.679,-27.467],[-20.366,-27.865],[-19.000,-28.000]]);
translate([-10,0]) circle(d=3.2);
translate([10,0]) circle(d=3.2);
translate([-10,22.0]) circle(d=3.2);
translate([10,22.0]) circle(d=3.2);
translate([-18,-20]) circle(d=3.2);
translate([18,-20]) circle(d=3.2);
translate([0,27]) circle(d=3.2);
polygon([[11.000,6.000],[11.585,6.058],[12.148,6.228],[12.667,6.506],[13.121,6.879],[13.494,7.333],[13.772,7.852],[13.942,8.415],[14.000,9.000],[14.000,12.000],[13.942,12.585],[13.772,13.148],[13.494,13.667],[13.121,14.121],[12.667,14.494],[12.148,14.772],[11.585,14.942],[11.000,15.000],[-11.000,15.000],[-11.585,14.942],[-12.148,14.772],[-12.667,14.494],[-13.121,14.121],[-13.494,13.667],[-13.772,13.148],[-13.942,12.585],[-14.000,12.000],[-14.000,9.000],[-13.942,8.415],[-13.772,7.852],[-13.494,7.333],[-13.121,6.879],[-12.667,6.506],[-12.148,6.228],[-11.585,6.058],[-11.000,6.000]]);
polygon([[12.000,-22.000],[12.780,-21.923],[13.531,-21.696],[14.222,-21.326],[14.828,-20.828],[15.326,-20.222],[15.696,-19.531],[15.923,-18.780],[16.000,-18.000],[16.000,-13.000],[15.923,-12.220],[15.696,-11.469],[15.326,-10.778],[14.828,-10.172],[14.222,-9.674],[13.531,-9.304],[12.780,-9.077],[12.000,-9.000],[-12.000,-9.000],[-12.780,-9.077],[-13.531,-9.304],[-14.222,-9.674],[-14.828,-10.172],[-15.326,-10.778],[-15.696,-11.469],[-15.923,-12.220],[-16.000,-13.000],[-16.000,-18.000],[-15.923,-18.780],[-15.696,-19.531],[-15.326,-20.222],[-14.828,-20.828],[-14.222,-21.326],[-13.531,-21.696],[-12.780,-21.923],[-12.000,-22.000]]);
}

module colonnina() linear_extrude(18.0)
difference() { polygon([[4.000,0.000],[3.923,0.780],[3.696,1.531],[3.326,2.222],[2.828,2.828],[2.222,3.326],[1.531,3.696],[0.780,3.923],[0.000,4.000],[-0.780,3.923],[-1.531,3.696],[-2.222,3.326],[-2.828,2.828],[-3.326,2.222],[-3.696,1.531],[-3.923,0.780],[-4.000,0.000],[-3.923,-0.780],[-3.696,-1.531],[-3.326,-2.222],[-2.828,-2.828],[-2.222,-3.326],[-1.531,-3.696],[-0.780,-3.923],[-0.000,-4.000],[0.780,-3.923],[1.531,-3.696],[2.222,-3.326],[2.828,-2.828],[3.326,-2.222],[3.696,-1.531],[3.923,-0.780]]);
translate([0,0]) circle(d=3.2);
}

module sede() translate([0,0,-1]) linear_extrude(3.0) union() { circle(d=7.5); translate([0,-3.0]) square([18,6.0]); }
module biella_motore_finita() difference() { biella_motore(); sede(); }
if (parte=="dito") dito(); if (parte=="biella_motore") biella_motore_finita(); if (parte=="biella_folle") biella_folle(); if (parte=="leva") leva(); if (parte=="piastra_bassa") piastra_bassa(); if (parte=="piastra_alta") piastra_alta(); if (parte=="colonnina") colonnina();
